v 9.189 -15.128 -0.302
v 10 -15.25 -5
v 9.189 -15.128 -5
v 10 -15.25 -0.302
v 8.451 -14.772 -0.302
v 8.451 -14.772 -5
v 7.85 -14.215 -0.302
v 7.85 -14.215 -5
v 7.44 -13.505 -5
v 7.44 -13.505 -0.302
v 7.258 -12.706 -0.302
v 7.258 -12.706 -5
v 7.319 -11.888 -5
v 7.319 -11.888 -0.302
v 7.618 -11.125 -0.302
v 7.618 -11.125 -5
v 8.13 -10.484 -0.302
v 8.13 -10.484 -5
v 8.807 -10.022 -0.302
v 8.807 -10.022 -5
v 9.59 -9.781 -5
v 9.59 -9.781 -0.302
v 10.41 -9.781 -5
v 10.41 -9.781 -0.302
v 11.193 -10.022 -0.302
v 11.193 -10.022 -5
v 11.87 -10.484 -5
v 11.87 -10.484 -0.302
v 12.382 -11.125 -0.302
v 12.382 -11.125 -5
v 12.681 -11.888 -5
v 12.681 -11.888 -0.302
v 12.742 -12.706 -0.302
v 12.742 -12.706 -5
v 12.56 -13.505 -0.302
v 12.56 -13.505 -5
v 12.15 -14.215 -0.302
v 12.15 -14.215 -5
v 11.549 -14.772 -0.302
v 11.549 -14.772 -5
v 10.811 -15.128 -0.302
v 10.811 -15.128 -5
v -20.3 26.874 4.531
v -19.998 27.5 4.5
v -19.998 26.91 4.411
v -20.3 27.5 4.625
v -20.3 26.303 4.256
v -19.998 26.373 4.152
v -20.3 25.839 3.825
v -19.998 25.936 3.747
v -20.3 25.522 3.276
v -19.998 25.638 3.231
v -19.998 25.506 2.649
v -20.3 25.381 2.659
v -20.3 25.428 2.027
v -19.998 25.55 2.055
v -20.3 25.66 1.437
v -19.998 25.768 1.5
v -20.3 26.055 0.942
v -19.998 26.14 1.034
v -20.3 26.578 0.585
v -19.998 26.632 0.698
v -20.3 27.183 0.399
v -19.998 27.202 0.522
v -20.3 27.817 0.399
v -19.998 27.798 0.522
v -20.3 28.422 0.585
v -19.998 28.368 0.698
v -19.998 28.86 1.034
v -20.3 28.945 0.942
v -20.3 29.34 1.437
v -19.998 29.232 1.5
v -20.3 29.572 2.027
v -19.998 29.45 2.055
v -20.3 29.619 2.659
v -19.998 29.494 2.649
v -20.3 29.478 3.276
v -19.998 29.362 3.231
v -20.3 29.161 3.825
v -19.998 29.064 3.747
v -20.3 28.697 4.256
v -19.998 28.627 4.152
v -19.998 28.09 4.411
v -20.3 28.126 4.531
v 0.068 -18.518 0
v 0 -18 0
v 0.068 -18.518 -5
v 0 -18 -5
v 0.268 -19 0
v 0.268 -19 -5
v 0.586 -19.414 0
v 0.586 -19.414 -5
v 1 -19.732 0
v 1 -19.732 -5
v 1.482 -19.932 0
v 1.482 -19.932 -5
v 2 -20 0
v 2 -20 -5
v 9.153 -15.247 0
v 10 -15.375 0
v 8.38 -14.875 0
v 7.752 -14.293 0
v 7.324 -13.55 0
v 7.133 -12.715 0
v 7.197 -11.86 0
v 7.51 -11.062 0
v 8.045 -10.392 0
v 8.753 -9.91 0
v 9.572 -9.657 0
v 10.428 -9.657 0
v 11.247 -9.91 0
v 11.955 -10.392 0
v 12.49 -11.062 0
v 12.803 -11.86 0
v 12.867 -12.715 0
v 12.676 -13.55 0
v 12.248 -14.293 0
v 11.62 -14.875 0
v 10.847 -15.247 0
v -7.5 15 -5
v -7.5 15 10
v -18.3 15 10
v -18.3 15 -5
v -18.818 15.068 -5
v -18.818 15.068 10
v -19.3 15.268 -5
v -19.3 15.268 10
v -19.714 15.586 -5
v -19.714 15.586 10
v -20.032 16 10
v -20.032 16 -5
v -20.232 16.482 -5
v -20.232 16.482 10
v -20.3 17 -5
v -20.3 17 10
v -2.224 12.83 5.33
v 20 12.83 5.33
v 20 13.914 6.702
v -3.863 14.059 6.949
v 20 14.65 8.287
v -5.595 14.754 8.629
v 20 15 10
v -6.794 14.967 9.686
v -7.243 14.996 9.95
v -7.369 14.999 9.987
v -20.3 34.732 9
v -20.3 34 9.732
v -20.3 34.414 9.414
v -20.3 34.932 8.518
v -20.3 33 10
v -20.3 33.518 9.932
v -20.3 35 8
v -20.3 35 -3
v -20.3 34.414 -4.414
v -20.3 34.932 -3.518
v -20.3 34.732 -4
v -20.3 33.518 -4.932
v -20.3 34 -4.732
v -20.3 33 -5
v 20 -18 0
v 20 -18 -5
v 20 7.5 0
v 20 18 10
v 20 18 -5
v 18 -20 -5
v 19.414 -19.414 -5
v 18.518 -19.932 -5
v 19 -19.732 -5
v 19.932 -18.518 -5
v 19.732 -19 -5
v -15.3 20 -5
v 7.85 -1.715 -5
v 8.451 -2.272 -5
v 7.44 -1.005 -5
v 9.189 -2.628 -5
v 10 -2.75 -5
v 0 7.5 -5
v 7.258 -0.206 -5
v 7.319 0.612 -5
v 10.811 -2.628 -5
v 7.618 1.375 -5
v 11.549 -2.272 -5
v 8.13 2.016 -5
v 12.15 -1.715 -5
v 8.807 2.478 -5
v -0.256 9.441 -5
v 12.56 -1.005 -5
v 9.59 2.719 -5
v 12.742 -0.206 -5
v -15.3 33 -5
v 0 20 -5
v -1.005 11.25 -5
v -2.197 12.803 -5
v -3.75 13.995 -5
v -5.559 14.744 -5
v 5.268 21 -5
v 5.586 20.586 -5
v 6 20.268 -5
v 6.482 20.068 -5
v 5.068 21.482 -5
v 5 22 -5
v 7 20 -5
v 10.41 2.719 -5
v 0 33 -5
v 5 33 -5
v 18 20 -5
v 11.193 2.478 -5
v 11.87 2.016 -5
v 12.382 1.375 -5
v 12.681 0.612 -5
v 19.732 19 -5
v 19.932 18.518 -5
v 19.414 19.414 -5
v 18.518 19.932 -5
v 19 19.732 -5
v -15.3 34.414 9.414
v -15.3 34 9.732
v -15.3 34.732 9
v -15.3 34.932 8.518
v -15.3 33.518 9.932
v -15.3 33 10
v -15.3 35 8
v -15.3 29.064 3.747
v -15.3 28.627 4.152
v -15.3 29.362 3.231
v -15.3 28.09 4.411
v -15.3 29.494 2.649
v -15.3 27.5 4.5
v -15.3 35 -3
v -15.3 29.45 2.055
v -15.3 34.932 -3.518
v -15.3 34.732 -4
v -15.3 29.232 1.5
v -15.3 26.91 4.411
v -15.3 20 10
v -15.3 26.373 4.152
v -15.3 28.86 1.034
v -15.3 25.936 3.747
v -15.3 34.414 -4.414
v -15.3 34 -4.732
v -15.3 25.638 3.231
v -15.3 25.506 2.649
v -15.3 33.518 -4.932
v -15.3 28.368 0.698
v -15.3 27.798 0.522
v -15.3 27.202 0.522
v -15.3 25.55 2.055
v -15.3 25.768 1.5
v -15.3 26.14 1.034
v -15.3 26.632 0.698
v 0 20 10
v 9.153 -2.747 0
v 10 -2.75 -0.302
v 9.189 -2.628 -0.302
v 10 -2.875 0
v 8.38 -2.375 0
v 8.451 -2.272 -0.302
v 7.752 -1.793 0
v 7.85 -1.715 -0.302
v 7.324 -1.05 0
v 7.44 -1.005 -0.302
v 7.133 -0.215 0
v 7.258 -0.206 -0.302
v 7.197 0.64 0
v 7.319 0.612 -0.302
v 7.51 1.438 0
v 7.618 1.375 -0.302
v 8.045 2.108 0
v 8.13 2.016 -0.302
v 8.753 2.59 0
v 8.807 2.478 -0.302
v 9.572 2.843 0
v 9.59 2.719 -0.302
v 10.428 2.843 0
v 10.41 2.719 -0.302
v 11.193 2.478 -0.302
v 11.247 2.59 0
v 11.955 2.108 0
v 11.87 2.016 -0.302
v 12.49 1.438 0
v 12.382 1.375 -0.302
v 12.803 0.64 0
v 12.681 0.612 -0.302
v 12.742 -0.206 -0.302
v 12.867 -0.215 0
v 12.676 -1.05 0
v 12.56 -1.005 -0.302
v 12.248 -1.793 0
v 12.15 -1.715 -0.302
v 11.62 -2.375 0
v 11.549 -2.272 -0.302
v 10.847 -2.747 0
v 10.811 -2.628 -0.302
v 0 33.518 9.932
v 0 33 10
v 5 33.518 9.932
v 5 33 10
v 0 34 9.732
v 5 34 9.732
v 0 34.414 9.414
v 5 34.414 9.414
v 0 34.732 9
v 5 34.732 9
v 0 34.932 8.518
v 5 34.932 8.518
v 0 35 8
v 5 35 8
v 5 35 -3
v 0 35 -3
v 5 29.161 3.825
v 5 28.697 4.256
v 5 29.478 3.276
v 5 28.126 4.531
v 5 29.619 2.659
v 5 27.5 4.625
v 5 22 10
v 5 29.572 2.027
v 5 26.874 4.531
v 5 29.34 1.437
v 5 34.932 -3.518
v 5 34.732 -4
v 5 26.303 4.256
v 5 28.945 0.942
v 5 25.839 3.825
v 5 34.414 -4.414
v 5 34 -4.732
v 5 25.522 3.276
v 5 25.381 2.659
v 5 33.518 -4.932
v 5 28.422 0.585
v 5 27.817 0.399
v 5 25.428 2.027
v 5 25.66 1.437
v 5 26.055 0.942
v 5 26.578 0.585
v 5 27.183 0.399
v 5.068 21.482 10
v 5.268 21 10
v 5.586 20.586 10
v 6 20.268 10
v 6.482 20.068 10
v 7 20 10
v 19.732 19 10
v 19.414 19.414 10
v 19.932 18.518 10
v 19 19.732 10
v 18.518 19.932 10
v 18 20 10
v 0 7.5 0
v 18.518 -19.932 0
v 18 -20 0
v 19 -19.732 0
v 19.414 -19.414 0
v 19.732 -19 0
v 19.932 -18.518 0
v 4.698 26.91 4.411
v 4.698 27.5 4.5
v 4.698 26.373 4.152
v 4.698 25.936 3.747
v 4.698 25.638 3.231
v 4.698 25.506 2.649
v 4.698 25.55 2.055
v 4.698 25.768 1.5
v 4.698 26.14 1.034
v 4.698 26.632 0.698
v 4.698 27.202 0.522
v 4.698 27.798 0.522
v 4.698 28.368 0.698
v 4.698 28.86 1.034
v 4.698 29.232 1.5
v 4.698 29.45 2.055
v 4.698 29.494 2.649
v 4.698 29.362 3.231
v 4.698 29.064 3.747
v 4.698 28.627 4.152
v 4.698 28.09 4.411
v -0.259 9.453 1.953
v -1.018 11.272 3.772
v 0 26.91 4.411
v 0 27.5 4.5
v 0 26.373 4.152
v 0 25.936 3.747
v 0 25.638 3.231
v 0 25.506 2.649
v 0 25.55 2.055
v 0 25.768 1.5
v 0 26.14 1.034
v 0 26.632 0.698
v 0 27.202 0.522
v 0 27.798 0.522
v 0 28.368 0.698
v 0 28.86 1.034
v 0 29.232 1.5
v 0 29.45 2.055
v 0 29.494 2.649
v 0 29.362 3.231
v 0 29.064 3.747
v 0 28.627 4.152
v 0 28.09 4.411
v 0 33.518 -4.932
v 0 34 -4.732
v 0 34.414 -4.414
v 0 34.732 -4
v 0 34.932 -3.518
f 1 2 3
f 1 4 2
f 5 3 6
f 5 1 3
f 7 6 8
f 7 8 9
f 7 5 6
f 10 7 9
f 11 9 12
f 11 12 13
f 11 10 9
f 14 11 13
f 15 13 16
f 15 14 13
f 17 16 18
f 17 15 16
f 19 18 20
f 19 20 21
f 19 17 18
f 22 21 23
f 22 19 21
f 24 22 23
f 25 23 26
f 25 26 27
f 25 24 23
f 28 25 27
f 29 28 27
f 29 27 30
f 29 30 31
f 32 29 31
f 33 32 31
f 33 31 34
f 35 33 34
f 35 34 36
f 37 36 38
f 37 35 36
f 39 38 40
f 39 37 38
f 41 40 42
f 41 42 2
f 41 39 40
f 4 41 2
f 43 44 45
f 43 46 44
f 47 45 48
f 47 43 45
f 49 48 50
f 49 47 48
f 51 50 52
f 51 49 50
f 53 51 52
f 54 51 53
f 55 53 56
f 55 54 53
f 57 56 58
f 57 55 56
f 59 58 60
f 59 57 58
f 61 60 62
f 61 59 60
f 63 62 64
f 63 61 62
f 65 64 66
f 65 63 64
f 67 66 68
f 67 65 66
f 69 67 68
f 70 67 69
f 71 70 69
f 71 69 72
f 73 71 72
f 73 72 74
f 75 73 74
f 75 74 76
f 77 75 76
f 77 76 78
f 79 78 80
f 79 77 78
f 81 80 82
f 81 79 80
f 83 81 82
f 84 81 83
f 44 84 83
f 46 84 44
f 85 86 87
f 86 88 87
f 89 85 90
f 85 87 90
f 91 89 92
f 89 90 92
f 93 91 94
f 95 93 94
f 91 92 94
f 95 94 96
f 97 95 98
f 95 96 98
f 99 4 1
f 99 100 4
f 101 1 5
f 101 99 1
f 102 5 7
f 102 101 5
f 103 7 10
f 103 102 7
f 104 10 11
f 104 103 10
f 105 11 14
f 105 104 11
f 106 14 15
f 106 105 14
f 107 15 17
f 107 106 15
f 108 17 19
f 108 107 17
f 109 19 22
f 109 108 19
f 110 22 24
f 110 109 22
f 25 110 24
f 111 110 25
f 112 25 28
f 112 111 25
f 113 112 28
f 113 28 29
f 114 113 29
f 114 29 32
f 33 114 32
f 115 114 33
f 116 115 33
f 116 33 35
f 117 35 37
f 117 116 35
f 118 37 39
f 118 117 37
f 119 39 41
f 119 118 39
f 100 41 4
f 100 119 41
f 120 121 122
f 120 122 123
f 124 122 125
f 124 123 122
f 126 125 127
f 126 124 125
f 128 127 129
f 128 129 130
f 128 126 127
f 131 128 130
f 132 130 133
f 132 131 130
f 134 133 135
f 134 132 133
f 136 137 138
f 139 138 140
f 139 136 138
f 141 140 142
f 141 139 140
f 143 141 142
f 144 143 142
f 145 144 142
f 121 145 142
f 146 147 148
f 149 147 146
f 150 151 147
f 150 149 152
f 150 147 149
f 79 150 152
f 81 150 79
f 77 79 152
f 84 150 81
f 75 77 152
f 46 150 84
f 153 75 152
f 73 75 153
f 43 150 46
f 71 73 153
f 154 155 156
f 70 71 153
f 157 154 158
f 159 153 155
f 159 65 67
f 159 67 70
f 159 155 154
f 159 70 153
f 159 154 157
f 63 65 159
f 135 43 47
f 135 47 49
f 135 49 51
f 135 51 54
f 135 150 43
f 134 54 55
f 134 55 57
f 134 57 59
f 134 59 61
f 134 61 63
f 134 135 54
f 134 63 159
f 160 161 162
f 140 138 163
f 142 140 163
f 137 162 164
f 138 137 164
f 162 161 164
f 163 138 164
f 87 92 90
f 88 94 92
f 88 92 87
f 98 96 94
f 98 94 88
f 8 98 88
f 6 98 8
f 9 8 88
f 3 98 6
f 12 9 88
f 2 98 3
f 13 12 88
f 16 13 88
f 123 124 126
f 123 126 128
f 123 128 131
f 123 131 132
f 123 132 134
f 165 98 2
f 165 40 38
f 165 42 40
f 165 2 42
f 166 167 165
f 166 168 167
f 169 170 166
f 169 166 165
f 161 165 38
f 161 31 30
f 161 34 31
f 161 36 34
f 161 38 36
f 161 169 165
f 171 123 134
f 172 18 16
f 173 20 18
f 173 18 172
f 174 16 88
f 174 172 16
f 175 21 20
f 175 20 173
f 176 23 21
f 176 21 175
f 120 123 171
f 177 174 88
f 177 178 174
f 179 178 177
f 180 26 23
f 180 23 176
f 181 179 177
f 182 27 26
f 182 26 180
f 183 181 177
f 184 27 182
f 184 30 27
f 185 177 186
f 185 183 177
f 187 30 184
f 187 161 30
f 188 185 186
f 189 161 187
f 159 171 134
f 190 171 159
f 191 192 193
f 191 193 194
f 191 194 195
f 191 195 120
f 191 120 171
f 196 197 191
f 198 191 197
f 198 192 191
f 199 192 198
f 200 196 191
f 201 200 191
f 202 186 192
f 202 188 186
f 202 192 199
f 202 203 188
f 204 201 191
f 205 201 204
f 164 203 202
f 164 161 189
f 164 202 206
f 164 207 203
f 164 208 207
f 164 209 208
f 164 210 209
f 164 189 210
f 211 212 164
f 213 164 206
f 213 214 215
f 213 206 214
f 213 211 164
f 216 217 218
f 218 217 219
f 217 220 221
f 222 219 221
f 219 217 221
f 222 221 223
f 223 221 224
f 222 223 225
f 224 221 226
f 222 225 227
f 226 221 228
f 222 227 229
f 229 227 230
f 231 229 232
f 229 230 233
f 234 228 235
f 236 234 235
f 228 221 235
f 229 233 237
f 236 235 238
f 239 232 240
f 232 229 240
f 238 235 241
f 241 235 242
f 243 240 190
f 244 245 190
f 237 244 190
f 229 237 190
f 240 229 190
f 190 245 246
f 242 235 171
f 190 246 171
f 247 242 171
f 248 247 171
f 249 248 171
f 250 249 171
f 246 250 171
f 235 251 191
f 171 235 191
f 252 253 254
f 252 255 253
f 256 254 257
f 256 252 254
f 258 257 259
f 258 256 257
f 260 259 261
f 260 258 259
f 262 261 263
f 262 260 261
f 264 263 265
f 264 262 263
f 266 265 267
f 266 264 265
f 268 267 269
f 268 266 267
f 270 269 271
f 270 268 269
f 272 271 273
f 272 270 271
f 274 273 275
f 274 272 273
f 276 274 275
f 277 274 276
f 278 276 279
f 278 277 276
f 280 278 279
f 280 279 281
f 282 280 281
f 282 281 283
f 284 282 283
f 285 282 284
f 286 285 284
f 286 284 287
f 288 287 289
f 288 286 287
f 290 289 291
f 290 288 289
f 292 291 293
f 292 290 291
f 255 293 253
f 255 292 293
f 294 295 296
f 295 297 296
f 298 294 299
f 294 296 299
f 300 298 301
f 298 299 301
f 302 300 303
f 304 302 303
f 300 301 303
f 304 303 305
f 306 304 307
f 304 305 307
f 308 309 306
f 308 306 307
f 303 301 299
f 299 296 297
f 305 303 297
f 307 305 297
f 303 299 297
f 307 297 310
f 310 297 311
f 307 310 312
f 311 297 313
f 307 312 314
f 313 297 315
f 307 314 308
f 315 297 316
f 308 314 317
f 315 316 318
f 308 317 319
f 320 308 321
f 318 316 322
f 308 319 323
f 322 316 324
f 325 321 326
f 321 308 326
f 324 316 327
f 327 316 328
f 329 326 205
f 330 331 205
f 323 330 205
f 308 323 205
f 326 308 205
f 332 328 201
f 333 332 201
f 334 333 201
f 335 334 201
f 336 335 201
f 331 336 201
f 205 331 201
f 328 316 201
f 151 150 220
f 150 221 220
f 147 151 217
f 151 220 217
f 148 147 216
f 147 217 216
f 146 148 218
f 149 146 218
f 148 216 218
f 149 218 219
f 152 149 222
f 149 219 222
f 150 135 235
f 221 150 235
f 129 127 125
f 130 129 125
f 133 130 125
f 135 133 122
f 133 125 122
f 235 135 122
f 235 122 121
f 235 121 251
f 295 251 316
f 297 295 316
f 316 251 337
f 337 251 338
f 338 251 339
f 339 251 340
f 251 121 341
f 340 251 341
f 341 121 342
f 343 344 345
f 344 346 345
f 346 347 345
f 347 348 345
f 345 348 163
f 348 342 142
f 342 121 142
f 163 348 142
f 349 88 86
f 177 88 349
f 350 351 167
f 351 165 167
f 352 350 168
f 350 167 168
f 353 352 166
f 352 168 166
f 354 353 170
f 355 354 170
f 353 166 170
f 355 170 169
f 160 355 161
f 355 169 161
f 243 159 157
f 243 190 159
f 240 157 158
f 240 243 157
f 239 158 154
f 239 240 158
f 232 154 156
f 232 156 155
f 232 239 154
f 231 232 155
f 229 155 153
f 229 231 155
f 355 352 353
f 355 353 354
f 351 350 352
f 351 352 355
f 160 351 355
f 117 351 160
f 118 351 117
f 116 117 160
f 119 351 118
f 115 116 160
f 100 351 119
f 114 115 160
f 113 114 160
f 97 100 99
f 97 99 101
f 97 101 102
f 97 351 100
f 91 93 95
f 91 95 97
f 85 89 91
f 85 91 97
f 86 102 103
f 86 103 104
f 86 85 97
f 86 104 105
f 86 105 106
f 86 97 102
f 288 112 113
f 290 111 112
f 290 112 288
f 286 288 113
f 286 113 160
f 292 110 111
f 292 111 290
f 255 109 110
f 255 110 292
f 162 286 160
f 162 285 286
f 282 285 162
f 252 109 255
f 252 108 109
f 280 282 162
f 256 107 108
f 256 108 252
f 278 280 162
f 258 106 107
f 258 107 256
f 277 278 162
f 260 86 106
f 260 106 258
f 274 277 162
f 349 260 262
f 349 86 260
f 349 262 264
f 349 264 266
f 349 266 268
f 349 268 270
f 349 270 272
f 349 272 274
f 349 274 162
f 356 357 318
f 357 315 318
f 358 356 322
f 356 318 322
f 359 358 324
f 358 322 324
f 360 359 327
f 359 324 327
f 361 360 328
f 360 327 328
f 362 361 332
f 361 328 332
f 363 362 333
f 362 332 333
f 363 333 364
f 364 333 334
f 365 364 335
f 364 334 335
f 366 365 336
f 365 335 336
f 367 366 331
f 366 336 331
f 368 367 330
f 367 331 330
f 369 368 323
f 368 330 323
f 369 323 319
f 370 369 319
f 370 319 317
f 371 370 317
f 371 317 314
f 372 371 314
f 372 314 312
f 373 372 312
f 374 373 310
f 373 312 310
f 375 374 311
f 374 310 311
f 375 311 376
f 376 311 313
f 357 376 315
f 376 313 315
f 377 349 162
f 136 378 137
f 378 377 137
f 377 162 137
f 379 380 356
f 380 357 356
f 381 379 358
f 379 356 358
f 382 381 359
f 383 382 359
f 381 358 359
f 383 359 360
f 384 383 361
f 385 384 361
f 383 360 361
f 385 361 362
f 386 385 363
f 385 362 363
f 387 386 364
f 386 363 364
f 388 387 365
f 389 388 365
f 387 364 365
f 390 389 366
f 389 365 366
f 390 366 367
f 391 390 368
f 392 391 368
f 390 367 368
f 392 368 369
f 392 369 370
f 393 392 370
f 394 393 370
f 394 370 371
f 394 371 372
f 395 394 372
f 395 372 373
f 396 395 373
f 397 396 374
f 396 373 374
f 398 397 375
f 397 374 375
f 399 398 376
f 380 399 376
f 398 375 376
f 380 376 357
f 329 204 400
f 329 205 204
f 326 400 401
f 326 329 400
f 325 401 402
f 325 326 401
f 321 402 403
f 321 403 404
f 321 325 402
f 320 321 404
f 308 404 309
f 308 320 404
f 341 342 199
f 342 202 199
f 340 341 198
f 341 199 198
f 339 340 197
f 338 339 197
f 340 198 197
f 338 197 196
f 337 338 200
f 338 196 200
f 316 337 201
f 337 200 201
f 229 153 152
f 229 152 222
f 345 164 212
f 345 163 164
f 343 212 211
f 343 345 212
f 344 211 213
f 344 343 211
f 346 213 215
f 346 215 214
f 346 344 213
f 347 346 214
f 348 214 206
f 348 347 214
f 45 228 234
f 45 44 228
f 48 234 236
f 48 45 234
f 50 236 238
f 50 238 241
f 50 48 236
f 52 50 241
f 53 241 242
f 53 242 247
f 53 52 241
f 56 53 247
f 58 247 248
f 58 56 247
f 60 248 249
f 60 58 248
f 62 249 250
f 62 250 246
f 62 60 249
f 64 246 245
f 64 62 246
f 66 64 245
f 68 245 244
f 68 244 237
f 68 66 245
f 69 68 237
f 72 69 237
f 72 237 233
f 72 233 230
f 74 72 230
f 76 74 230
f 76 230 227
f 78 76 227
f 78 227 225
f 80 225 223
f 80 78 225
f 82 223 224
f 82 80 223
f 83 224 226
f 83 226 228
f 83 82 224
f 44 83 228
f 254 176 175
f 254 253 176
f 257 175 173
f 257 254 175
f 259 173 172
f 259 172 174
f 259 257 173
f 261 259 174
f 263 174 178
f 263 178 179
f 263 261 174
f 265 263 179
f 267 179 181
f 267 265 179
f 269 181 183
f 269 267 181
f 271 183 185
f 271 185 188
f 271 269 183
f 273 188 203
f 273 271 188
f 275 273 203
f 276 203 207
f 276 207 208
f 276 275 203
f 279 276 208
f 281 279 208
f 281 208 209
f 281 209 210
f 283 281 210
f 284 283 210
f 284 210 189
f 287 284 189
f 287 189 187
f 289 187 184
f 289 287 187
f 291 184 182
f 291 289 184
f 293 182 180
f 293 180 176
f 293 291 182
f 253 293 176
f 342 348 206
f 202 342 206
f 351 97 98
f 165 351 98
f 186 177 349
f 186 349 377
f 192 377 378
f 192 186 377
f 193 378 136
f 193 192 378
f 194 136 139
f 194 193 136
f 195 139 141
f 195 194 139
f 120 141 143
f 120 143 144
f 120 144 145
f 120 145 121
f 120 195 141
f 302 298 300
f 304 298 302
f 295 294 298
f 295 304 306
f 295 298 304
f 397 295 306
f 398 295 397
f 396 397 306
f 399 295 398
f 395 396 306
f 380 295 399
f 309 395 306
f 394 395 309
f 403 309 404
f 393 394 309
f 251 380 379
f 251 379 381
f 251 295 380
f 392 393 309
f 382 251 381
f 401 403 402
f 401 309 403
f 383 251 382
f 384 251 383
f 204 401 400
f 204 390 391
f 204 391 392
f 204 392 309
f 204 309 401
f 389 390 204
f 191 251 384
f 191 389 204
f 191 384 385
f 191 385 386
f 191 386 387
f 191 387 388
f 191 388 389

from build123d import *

# Parameters (mm, degrees)
SKETCH1_W                           = 10
SKETCH1_H                           = 5
SKETCH1_W_2                         = 5
SKETCH1_H_2                         = 40
BOSS_EXTRUDE1_DEPTH                 = 20
SKETCH3_W                           = 15
SKETCH3_H                           = 5
BOSS_EXTRUDE2_DEPTH                 = 20.3
CHAMFER2_SIZE                       = 7.5
SKETCH4_W                           = 5
SKETCH4_H                           = 15
BOSS_EXTRUDE3_DEPTH                 = 15
FILLET1_R                           = 7.5
F_5_5_5_5_DIAMETER_HOLE1_AT_2_COUNT = 2
F_5_5_5_5_DIAMETER_HOLE1_AT_2_PITCH = 12.5
FILLET2_R                           = 2


with BuildPart() as part:
    # Sketch1 → Boss-Extrude1 (new body)
    with BuildSketch(Plane(origin=(0, 0, 0), x_dir=(0, 0, -1), z_dir=(1, 0, 0))):
        with Locations((-5, 17.5)):
            Rectangle(SKETCH1_W, SKETCH1_H)
        with Locations((2.5, 0)):
            Rectangle(SKETCH1_W_2, SKETCH1_H_2)
    extrude(amount=BOSS_EXTRUDE1_DEPTH)

    # Sketch3 → Boss-Extrude2 (add)
    with BuildSketch(Plane(origin=(0, 0, 0), x_dir=(0, 0, -1), z_dir=(1, 0, 0))):
        with Locations((-2.5, 17.5)):
            Rectangle(SKETCH3_W, SKETCH3_H)
    extrude(amount=-BOSS_EXTRUDE2_DEPTH)

    # Chamfer2
    chamfer2_edges = [part.edges().sort_by_distance(p)[0] for p in [
        (10, 15, 0),
    ]]
    chamfer(chamfer2_edges, length=CHAMFER2_SIZE)

    # Sketch4 → Boss-Extrude3 (add)
    with BuildSketch(Plane(origin=(0, 20, 0), x_dir=(1, 0, 0), z_dir=(0, 1, 0))):
        with Locations((-17.8, -2.5)):
            Rectangle(SKETCH4_W, SKETCH4_H)
        with Locations((2.5, -2.5)):
            Rectangle(SKETCH4_W, SKETCH4_H)
    extrude(amount=BOSS_EXTRUDE3_DEPTH)

    # Fillet1
    # the kernel refuses this fillet: 7.5 mm, written as the material it adds along each edge
    with BuildSketch(Plane(origin=(0, 15, 7.5), x_dir=(0, -0.7071067811865472, -0.7071067811865479), z_dir=(1, 0, 0))) as fillet1_piece_1:
        with BuildLine():
            CenterArc((3.068709481, -7.5), FILLET1_R, 90, 40.155443777)
            Line((-1.767766953, -1.767766953), (0, 0))
            Line((0, 0), (3.068709481, 0))
        make_face()
    extrude(amount=20)
    with BuildSketch(Plane(origin=(0, 15, -5), x_dir=(0, -1, 0), z_dir=(0, 0, 1))) as fillet1_piece_2_section:
        with BuildLine():
            CenterArc((FILLET1_R, -FILLET1_R), FILLET1_R, 90, 90)
            Line((0, -FILLET1_R), (0, 0))
            Line((0, 0), (FILLET1_R, 0))
        make_face()
    fillet1_piece_2 = extrude(amount=31.25, mode=Mode.PRIVATE)
    fillet1_piece_2 = split(fillet1_piece_2, bisect_by=Plane(origin=(0, 8.75, 1.25), z_dir=(0, 0.7071067811865477, -0.7071067811865474)), keep=Keep.TOP, mode=Mode.PRIVATE)
    add(fillet1_piece_2)
    with BuildSketch(Plane(origin=(0, 15, -5), x_dir=(0, -1, 0), z_dir=(0, 0, 1))) as fillet1_piece_3a_section:
        with BuildLine():
            CenterArc((FILLET1_R, -FILLET1_R), FILLET1_R, 90, 90)
            Line((0, -FILLET1_R), (0, 0))
            Line((0, 0), (FILLET1_R, 0))
        make_face()
    fillet1_piece_3a = extrude(amount=31.25, mode=Mode.PRIVATE)
    fillet1_piece_3a = split(fillet1_piece_3a, bisect_by=Plane(origin=(0, 15, 10), z_dir=(0, 0, -1)), keep=Keep.TOP, mode=Mode.PRIVATE)
    fillet1_piece_3a = split(fillet1_piece_3a, bisect_by=Plane(origin=(0, 8.75, 1.25), z_dir=(0, -0.7071067811865477, 0.7071067811865474)), keep=Keep.TOP, mode=Mode.PRIVATE)
    with BuildSketch(Plane(origin=(-7.671773702, 15, 7.5), x_dir=(0, -0.7071067811865472, -0.7071067811865479), z_dir=(1, 0, 0))) as fillet1_piece_3b_section:
        with BuildLine():
            CenterArc((3.068709481, -7.5), FILLET1_R, 90, 40.155443777)
            Line((-1.767766953, -1.767766953), (0, 0))
            Line((0, 0), (3.068709481, 0))
        make_face()
    fillet1_piece_3b = extrude(amount=27.671773702, mode=Mode.PRIVATE)
    fillet1_piece_3b = split(fillet1_piece_3b, bisect_by=Plane(origin=(0, 15, 7.5), z_dir=(-1, 0, 0)), keep=Keep.TOP, mode=Mode.PRIVATE)
    fillet1_piece_3 = fillet1_piece_3a & fillet1_piece_3b
    add(fillet1_piece_3)

    # Sketch9 → Ø5.5 (5.5) Diameter Hole1 (revolve, cut)
    with BuildSketch(Plane(origin=(10, 0, 0), x_dir=(0, -1, 0), z_dir=(1, 0, 0))):
        Polygon((0, 0), (0, 5), (2.75, 5), (2.75, 0.301776695), (2.875, 0), align=None)
    f_5_5_5_5_diameter_hole1 = revolve(axis=Axis((10, 0, 6.35), (0, 0, -1)), mode=Mode.SUBTRACT)

    # Ø5.5 (5.5) Diameter Hole1 at 2: Ø5.5 (5.5) Diameter Hole1 ×2
    with Locations(*[(0, -i * F_5_5_5_5_DIAMETER_HOLE1_AT_2_PITCH, 0) for i in range(1, F_5_5_5_5_DIAMETER_HOLE1_AT_2_COUNT)]):
        add(f_5_5_5_5_diameter_hole1, mode=Mode.SUBTRACT)

    # Sketch12 → Ø4.0 (4) Diameter Hole1 (revolve, cut)
    with BuildSketch(Plane(origin=(-20.3, 27.5, 2.5), x_dir=(0, 0, 1), z_dir=(0, 1, 0))):
        Polygon((0, 0), (0, 5), (2, 5), (2, 0.301776695), (2.125, 0), align=None)
    f_4_0_4_diameter_hole1 = revolve(axis=Axis((-26.65, 27.5, 2.5), (1, 0, 0)), mode=Mode.SUBTRACT)

    # Mirror1: Ø4.0 (4) Diameter Hole1 across plane
    add(f_4_0_4_diameter_hole1.mirror(Plane(origin=(-7.65, 0, 0), x_dir=(0, 0, 1), z_dir=(1, 0, 0))), mode=Mode.SUBTRACT)

    # Fillet2
    fillet2_edges = [part.edges().sort_by_distance(p)[0] for p in [
        (20, -20, -2.5),
        (-20.3, 15, 2.5),
        (20, 20, 2.5),
        (-17.8, 35, -5),
        (-17.8, 35, 10),
        (5, 20, 2.5),
        (2.5, 35, 10),
        (2.5, 35, -5),
        (0, -20, -2.5),
    ]]
    fillet(fillet2_edges, radius=FILLET2_R)


solid = part.part
